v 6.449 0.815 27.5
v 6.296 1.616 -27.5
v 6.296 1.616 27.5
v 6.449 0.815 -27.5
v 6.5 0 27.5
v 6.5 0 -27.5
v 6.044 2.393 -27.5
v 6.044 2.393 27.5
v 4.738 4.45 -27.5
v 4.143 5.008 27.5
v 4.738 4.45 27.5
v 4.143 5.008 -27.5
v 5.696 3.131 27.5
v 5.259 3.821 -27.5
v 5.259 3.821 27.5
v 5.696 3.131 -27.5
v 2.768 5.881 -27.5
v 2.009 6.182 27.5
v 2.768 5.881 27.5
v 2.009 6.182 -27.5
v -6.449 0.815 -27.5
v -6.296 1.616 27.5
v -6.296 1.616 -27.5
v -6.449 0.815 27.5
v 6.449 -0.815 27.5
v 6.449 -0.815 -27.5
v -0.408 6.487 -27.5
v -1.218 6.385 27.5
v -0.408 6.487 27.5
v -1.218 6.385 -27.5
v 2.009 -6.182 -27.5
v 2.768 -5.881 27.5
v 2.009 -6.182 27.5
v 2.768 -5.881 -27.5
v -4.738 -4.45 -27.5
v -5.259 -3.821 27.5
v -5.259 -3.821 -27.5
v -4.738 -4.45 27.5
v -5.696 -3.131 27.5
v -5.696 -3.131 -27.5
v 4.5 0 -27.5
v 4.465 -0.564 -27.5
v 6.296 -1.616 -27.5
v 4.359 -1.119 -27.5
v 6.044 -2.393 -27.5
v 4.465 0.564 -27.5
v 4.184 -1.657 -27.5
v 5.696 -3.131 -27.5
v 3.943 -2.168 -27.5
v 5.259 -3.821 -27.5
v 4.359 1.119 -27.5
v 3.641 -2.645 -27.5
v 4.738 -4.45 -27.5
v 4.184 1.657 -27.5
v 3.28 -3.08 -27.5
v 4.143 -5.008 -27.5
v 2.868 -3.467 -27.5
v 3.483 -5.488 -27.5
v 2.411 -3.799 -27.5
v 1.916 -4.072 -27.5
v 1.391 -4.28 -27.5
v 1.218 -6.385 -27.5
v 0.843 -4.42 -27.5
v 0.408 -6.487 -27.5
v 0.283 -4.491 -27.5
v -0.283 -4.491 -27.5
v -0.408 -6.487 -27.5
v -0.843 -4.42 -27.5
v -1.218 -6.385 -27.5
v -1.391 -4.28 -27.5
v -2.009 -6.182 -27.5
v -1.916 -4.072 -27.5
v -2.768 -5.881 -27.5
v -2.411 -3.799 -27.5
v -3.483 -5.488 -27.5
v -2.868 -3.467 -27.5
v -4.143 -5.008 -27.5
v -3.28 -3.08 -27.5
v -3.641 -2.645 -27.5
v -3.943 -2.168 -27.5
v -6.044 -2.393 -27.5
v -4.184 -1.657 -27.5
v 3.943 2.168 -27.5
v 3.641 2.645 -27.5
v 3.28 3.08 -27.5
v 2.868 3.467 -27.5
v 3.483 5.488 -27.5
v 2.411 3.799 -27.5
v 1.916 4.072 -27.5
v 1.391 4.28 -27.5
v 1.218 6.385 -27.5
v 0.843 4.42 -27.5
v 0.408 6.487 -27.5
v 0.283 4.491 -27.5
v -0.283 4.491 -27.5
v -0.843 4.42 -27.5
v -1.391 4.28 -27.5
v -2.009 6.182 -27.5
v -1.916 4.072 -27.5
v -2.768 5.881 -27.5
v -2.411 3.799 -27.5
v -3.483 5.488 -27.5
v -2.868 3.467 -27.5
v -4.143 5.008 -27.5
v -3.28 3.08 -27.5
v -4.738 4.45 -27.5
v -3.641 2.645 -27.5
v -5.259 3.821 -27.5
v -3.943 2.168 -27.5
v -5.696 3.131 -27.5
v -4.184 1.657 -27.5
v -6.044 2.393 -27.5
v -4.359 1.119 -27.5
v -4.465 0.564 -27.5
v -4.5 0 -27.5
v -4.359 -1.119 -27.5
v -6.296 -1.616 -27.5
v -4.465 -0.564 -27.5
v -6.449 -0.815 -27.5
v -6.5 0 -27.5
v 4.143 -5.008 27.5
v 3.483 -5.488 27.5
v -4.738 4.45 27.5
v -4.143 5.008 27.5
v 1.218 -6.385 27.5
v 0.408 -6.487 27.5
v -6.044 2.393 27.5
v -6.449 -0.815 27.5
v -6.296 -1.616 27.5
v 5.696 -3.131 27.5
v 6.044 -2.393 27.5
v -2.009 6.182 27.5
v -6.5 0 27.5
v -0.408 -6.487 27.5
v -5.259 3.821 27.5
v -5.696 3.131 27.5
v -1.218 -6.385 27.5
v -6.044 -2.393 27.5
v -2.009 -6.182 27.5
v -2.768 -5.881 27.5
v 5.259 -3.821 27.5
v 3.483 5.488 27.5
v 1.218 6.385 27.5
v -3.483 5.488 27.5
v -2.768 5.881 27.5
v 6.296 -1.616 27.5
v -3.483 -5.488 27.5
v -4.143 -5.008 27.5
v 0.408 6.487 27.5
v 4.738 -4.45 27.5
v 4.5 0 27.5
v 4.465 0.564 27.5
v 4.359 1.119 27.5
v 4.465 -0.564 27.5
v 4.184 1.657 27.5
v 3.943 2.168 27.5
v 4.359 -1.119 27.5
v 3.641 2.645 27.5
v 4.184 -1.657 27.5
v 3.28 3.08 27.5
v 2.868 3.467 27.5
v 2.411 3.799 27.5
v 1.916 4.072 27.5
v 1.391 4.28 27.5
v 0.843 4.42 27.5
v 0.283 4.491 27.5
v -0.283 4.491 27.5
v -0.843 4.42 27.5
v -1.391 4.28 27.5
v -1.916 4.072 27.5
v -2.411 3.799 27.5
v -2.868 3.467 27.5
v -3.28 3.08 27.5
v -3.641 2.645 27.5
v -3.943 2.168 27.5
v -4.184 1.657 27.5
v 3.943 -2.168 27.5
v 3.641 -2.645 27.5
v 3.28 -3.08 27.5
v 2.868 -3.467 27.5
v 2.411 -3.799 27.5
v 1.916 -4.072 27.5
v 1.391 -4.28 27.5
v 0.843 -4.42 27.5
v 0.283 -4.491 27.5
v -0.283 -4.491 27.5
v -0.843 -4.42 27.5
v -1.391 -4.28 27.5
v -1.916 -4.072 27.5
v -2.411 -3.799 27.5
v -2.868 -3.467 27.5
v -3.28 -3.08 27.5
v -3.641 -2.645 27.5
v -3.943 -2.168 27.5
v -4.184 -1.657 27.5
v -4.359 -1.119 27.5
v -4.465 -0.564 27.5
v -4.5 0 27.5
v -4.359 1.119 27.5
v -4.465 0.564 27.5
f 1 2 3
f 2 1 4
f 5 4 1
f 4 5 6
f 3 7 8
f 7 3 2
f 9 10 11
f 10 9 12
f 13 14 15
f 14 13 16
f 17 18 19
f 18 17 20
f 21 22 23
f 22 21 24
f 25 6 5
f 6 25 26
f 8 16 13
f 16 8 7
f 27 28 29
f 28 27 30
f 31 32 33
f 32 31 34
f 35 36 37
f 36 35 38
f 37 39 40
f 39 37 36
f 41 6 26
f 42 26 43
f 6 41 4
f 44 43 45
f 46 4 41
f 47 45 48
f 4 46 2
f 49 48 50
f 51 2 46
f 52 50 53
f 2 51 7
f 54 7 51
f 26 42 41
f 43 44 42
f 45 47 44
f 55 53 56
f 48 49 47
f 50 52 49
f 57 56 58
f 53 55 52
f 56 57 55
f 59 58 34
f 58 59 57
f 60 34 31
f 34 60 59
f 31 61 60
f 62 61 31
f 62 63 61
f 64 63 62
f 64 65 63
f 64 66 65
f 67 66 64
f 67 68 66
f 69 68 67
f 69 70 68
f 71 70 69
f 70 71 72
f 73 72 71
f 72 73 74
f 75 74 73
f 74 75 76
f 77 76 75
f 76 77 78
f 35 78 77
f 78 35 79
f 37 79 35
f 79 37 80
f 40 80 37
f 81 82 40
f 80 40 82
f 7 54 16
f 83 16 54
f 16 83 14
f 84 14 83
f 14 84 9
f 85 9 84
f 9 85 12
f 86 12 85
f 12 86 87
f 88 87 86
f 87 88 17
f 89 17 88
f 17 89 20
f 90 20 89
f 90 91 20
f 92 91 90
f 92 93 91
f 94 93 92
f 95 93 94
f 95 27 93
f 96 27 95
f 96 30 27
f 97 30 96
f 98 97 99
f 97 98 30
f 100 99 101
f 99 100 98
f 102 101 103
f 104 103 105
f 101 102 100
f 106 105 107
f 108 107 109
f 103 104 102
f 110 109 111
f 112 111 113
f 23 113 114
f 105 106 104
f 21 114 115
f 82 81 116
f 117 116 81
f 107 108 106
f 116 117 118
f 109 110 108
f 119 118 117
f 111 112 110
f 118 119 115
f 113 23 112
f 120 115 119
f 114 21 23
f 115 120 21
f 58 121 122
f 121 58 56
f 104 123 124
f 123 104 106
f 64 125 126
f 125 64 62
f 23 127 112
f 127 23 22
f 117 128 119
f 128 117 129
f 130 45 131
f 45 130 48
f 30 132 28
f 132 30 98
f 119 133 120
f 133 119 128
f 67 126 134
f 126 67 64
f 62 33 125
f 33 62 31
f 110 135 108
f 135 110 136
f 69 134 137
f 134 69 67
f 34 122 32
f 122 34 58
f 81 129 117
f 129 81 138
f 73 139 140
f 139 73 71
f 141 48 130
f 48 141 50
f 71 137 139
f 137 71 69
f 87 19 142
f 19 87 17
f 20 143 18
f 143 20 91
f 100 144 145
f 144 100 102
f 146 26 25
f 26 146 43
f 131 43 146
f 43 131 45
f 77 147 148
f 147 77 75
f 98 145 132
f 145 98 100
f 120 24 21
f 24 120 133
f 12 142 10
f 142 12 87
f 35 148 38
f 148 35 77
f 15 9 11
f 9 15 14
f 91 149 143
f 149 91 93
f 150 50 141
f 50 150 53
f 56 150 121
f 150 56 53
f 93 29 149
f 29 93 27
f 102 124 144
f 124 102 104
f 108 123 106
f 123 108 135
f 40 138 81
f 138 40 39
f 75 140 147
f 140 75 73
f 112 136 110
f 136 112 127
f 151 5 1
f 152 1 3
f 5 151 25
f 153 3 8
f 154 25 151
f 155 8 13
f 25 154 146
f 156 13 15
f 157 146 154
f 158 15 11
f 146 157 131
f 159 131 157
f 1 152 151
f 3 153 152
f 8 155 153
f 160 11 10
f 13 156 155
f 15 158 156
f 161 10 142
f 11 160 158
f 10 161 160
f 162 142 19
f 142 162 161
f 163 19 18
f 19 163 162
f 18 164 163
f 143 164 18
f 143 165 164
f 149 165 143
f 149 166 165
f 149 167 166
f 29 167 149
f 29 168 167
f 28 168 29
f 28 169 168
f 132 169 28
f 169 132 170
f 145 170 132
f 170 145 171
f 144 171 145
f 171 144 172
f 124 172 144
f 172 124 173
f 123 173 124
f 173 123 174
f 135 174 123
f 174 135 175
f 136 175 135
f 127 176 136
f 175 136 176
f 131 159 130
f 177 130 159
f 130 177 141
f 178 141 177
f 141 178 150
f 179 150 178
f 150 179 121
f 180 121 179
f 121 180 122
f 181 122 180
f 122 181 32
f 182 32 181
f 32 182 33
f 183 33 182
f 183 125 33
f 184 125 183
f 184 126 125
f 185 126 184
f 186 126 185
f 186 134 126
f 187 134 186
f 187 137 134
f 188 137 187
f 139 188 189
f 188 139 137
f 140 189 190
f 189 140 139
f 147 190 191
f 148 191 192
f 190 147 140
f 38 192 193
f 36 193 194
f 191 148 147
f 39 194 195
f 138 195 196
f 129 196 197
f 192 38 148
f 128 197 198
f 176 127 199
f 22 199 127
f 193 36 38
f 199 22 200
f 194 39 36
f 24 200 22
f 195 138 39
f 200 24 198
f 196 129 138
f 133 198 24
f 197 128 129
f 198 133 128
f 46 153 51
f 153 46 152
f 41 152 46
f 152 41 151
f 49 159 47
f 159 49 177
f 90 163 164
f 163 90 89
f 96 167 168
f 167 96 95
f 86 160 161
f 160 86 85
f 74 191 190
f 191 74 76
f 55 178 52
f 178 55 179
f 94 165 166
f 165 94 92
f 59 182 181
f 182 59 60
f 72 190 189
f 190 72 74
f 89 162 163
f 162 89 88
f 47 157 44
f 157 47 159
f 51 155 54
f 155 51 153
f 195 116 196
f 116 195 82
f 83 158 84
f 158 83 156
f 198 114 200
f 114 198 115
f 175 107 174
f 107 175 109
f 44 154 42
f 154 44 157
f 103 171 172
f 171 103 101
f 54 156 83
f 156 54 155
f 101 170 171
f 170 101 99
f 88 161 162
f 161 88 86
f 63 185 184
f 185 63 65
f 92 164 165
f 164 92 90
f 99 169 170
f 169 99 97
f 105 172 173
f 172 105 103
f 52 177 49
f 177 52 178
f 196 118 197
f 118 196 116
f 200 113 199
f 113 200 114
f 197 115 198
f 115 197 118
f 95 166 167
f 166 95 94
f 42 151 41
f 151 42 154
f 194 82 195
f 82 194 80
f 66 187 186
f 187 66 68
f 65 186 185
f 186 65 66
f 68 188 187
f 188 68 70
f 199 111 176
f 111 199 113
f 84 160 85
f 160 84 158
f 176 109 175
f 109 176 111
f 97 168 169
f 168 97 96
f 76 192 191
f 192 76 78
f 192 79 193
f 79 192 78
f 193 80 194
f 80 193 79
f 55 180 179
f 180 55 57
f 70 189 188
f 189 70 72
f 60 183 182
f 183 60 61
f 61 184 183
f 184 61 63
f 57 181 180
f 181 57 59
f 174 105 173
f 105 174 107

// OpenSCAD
$fn = 50;


difference() {
	union() {
		translate(v = [0, 0, -27.5000000000]) {
			cylinder(h = 55, r = 6.5000000000);
		}
	}
	union() {
		translate(v = [0, 0, -100.0000000000]) {
			cylinder(h = 200, r = 4.5000000000);
		}
	}
}
